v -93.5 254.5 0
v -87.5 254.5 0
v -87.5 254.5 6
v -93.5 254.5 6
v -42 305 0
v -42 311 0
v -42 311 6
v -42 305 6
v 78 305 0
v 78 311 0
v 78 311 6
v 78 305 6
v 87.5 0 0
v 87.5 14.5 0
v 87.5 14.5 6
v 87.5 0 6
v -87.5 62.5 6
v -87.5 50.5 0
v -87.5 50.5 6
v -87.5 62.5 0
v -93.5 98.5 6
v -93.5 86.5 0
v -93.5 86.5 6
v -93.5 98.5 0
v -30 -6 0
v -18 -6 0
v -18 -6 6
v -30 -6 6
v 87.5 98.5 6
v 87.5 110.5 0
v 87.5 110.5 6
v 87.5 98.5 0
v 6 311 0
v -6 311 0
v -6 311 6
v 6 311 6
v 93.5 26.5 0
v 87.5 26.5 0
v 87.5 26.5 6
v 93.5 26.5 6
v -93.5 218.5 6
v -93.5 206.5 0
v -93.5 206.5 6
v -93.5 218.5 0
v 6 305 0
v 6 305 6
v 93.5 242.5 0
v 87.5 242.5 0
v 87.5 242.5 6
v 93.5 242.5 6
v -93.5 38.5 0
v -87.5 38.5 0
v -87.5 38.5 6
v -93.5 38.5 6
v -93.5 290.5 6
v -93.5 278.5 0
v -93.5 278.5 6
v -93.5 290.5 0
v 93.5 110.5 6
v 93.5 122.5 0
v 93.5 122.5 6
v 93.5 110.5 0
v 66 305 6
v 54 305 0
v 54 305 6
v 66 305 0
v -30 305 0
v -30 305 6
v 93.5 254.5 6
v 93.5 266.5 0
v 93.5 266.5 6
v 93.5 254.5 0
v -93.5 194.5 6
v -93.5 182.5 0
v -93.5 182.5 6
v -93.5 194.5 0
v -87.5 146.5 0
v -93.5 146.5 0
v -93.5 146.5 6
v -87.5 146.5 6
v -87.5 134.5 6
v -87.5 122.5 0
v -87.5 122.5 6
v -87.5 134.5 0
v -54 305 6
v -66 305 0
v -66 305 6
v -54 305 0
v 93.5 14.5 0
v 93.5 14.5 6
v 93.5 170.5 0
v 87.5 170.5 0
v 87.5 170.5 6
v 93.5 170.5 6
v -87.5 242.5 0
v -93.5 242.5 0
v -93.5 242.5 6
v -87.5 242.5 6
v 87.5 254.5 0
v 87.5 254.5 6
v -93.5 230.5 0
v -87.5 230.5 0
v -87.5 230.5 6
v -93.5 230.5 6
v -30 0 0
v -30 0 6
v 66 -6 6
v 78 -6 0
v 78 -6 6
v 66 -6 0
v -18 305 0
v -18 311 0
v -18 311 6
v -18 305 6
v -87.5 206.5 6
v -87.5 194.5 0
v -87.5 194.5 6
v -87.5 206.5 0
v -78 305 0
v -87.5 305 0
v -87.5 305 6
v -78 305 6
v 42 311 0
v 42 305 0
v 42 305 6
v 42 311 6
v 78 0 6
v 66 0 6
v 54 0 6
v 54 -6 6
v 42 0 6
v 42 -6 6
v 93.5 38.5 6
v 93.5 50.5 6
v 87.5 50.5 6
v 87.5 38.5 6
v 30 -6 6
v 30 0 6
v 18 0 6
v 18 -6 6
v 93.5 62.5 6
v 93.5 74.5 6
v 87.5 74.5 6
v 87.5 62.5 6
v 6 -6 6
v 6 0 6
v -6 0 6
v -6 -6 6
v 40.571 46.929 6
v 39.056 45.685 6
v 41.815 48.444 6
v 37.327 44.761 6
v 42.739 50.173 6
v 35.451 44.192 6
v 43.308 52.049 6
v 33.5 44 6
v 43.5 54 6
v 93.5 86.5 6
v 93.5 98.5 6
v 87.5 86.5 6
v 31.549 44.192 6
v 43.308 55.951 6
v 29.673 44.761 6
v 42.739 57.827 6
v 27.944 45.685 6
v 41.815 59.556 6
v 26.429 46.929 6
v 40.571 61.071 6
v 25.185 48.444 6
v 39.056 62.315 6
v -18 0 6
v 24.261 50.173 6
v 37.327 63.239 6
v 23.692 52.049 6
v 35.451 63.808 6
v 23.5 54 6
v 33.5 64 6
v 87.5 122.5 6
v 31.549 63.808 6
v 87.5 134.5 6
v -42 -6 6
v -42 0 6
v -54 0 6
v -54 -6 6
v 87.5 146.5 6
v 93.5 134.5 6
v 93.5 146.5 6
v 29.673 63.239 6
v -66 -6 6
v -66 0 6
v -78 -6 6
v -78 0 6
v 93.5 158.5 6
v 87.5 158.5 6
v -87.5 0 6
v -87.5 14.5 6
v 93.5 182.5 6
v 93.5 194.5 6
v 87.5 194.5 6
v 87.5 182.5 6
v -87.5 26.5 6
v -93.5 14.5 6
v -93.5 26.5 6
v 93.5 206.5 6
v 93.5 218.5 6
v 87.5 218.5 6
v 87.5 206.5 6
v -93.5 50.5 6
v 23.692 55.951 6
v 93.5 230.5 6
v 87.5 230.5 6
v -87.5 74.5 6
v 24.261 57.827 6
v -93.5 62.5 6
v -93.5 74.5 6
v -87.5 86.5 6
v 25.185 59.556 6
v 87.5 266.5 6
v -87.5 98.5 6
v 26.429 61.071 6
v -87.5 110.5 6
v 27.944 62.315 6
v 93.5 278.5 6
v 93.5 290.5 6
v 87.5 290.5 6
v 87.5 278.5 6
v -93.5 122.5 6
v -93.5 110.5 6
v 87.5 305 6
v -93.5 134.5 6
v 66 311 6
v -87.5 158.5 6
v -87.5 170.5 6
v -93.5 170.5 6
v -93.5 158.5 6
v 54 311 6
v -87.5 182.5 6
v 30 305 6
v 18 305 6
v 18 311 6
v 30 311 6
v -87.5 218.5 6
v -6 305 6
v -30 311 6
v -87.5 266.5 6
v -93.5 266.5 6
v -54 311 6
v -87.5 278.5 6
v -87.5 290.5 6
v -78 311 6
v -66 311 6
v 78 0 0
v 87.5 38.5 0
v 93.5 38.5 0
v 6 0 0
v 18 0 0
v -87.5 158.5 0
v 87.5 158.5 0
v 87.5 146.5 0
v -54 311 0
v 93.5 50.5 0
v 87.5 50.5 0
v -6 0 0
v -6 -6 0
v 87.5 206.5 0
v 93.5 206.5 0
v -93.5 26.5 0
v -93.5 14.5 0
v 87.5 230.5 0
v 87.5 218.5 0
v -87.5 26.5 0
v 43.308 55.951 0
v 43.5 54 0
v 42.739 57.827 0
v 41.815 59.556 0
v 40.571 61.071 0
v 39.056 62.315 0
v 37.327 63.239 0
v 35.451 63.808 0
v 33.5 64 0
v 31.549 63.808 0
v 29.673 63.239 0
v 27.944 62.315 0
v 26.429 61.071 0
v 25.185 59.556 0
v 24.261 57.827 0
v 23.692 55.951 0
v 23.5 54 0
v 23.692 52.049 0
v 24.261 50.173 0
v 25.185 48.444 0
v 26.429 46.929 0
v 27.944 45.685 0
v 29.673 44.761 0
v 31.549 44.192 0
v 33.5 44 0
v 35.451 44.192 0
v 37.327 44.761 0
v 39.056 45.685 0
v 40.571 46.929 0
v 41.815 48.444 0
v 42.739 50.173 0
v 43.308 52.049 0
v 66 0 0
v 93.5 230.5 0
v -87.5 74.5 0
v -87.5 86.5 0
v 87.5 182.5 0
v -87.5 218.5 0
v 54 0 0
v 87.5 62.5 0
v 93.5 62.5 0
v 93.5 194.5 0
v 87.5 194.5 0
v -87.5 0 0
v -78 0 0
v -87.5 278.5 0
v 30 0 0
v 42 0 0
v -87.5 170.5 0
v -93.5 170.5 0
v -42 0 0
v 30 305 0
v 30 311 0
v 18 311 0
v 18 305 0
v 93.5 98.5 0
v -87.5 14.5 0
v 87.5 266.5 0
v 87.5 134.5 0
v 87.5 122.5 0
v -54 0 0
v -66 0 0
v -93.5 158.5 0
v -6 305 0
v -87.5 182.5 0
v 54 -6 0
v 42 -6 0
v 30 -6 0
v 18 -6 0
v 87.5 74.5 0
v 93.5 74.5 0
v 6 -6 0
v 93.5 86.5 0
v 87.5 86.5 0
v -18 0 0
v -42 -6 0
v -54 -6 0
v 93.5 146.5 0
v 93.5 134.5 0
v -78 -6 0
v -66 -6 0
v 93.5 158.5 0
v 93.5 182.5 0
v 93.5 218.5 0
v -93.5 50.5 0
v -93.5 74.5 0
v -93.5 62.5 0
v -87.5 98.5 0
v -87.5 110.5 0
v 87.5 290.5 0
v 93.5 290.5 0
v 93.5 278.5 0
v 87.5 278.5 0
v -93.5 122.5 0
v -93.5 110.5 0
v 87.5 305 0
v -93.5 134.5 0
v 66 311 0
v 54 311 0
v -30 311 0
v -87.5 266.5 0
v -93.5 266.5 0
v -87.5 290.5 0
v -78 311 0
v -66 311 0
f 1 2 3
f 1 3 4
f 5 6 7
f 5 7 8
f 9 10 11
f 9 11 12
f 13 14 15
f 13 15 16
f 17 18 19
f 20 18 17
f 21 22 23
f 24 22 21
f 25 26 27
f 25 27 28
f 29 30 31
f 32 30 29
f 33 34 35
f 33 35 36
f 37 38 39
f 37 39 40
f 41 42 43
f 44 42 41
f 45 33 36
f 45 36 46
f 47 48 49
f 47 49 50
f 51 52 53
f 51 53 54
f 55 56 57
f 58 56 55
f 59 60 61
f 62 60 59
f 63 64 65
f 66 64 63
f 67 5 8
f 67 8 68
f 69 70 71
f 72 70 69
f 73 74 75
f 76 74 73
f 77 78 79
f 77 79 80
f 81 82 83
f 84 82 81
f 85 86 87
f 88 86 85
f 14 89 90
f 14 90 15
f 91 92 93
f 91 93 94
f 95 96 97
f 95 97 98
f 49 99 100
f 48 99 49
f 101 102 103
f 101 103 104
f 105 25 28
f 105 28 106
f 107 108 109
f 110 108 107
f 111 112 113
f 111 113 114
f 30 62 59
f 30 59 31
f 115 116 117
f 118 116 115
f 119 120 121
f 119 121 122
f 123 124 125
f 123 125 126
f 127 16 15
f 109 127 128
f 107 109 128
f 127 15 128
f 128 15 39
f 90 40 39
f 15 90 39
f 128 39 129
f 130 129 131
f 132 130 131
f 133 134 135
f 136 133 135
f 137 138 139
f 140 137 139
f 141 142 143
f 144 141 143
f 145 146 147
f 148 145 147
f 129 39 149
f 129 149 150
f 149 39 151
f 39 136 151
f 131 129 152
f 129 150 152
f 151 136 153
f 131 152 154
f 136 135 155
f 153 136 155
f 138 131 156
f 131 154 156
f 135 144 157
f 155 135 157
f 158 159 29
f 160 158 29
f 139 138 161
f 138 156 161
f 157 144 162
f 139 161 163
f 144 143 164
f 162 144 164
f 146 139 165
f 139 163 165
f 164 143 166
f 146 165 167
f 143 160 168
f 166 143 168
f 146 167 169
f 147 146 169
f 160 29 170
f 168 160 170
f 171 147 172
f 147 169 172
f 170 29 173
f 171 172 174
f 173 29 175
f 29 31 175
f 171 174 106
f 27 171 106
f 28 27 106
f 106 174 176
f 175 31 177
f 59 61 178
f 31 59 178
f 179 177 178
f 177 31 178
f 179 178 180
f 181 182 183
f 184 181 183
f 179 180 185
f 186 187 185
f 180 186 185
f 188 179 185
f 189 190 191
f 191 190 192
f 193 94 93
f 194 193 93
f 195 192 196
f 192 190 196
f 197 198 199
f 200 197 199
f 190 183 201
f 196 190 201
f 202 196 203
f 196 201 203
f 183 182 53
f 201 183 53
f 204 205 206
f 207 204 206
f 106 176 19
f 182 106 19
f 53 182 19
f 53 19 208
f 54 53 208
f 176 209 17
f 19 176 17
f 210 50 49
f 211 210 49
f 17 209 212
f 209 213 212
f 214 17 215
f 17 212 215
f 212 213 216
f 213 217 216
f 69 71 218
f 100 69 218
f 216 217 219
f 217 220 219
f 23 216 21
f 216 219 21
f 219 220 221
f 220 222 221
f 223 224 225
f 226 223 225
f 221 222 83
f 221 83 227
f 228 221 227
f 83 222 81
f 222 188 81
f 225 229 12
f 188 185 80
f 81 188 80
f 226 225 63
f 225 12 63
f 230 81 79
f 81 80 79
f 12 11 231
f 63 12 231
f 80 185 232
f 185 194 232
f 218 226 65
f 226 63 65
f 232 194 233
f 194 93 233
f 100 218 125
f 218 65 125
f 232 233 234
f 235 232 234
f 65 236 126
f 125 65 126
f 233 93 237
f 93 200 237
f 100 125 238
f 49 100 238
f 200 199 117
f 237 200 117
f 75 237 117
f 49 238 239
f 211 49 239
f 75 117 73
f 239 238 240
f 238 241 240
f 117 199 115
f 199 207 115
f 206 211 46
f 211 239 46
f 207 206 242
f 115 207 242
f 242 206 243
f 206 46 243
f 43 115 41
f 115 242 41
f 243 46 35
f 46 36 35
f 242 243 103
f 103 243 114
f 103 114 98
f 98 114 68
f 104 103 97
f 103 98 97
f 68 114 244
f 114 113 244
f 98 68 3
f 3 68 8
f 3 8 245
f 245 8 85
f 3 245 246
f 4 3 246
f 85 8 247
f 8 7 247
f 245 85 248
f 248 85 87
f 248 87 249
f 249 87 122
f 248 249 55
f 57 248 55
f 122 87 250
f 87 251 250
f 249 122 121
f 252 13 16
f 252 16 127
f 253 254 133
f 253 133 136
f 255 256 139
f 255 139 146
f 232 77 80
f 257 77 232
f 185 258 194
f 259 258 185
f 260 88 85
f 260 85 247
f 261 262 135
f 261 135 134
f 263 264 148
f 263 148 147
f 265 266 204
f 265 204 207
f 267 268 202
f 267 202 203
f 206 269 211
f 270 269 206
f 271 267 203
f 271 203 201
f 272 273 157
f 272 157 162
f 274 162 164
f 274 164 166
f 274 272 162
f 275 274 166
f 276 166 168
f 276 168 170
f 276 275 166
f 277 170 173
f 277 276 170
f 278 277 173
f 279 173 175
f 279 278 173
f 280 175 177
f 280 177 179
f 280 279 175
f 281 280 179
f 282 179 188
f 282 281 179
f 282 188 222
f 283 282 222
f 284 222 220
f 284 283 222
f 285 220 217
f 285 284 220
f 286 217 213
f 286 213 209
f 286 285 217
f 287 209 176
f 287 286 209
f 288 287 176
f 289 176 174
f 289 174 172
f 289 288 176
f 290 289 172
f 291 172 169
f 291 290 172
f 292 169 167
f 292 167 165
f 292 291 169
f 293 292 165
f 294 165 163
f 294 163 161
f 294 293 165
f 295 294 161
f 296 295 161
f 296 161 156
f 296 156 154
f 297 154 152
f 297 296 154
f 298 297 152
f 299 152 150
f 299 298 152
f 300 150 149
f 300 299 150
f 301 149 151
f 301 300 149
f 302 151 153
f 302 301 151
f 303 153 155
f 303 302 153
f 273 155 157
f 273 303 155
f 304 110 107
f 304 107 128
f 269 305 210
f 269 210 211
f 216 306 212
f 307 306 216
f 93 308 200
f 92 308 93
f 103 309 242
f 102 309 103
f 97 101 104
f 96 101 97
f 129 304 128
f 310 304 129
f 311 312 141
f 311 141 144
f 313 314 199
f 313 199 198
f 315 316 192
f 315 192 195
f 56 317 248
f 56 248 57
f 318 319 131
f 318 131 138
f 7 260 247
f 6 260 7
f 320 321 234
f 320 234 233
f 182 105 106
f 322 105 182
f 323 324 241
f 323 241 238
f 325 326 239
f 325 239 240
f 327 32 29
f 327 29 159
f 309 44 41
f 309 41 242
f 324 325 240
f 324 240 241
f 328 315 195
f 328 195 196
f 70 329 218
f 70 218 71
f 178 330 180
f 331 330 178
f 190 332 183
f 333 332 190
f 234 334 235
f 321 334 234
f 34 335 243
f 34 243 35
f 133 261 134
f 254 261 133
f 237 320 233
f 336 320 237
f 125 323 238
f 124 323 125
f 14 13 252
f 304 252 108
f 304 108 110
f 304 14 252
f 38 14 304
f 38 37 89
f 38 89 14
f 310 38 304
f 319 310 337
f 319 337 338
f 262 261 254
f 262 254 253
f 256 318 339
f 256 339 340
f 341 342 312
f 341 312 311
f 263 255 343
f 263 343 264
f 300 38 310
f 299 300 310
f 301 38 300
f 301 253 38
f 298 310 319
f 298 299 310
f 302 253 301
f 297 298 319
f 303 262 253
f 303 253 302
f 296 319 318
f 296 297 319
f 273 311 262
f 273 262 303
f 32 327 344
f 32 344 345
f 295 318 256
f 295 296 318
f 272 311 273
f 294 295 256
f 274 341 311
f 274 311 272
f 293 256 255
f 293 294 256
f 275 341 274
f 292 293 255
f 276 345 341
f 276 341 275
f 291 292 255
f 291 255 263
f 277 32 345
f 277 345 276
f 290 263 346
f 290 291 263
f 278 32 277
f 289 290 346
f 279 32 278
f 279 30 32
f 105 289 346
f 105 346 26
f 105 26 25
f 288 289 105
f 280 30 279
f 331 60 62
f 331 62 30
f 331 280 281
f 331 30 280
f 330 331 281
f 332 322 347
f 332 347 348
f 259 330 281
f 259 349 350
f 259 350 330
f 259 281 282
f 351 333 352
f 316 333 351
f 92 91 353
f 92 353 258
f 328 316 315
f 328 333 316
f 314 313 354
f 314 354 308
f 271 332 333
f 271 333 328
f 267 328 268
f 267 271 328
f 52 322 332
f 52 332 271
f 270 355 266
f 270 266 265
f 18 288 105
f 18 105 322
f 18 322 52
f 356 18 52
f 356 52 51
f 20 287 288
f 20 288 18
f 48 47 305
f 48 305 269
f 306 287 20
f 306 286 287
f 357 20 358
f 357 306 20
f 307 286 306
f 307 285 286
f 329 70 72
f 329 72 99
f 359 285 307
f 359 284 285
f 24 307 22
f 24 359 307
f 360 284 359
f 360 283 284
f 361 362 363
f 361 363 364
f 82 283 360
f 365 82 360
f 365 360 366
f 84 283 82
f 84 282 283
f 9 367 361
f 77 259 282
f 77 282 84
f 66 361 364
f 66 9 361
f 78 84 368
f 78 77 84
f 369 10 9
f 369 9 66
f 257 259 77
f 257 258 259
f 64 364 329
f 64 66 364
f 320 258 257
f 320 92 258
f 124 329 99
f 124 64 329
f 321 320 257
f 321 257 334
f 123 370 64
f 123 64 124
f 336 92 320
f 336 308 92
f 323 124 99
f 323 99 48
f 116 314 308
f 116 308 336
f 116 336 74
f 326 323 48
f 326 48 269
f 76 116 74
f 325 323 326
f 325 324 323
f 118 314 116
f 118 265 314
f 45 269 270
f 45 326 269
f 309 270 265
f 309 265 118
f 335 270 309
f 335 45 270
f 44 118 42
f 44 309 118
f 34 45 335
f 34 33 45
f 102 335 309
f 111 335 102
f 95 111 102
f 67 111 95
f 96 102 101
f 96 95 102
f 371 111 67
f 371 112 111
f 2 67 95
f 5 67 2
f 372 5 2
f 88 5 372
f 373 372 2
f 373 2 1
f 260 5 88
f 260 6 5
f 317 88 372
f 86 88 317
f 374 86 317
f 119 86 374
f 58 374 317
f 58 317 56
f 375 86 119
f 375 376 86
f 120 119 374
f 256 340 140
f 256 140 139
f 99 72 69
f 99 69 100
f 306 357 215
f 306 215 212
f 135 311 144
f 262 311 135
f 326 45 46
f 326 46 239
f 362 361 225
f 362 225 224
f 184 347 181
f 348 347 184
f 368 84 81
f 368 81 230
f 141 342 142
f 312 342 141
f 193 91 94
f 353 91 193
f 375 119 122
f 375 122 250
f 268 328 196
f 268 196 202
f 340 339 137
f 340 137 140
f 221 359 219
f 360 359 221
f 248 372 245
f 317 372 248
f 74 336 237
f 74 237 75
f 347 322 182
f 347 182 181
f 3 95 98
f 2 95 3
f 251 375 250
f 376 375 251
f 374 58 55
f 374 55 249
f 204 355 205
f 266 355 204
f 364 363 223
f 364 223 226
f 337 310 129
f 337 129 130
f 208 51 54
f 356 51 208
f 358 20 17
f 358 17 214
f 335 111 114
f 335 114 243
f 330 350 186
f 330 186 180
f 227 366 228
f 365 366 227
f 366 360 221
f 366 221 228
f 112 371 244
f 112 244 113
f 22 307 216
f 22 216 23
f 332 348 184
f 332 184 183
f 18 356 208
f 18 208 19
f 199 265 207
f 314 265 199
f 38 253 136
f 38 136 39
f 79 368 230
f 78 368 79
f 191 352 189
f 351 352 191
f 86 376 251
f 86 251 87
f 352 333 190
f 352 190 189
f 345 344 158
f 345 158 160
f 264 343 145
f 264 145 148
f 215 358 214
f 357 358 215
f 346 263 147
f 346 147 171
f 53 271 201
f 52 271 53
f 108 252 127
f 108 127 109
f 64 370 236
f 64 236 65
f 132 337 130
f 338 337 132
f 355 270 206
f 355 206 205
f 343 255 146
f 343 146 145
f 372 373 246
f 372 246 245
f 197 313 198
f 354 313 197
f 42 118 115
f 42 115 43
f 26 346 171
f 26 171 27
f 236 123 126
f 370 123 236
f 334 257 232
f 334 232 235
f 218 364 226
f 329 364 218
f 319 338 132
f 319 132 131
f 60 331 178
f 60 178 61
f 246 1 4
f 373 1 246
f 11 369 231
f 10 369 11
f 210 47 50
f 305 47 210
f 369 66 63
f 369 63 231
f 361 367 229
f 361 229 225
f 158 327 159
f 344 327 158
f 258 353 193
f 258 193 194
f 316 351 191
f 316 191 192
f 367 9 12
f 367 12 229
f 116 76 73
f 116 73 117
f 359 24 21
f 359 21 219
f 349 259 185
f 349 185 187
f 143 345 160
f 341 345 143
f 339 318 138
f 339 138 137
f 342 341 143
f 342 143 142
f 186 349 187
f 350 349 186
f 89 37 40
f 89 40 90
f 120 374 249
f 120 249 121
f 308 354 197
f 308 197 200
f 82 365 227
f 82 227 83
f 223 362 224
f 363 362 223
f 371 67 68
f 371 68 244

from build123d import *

# Parameters (mm, degrees)
SKETCH1_R           = 10
BOSS_EXTRUDE1_DEPTH = 6


with BuildPart() as part:
    # Sketch1 → Boss-Extrude1 (new body)
    with BuildSketch(Plane.XY):
        Polygon((78, 0), (78, -6), (66, -6), (66, 0), (54, 0), (54, -6), (42, -6), (42, 0), (30, 0), (30, -6), (18, -6), (18, 0), (6, 0), (6, -6), (-6, -6), (-6, 0), (-18, 0), (-18, -6), (-30, -6), (-30, 0), (-42, 0), (-42, -6), (-54, -6), (-54, 0), (-66, 0), (-66, -6), (-78, -6), (-78, 0), (-87.5, 0), (-87.5, 14.5), (-93.5, 14.5), (-93.5, 26.5), (-87.5, 26.5), (-87.5, 38.5), (-93.5, 38.5), (-93.5, 50.5), (-87.5, 50.5), (-87.5, 62.5), (-93.5, 62.5), (-93.5, 74.5), (-87.5, 74.5), (-87.5, 86.5), (-93.5, 86.5), (-93.5, 98.5), (-87.5, 98.5), (-87.5, 110.5), (-93.5, 110.5), (-93.5, 122.5), (-87.5, 122.5), (-87.5, 134.5), (-93.5, 134.5), (-93.5, 146.5), (-87.5, 146.5), (-87.5, 158.5), (-93.5, 158.5), (-93.5, 170.5), (-87.5, 170.5), (-87.5, 182.5), (-93.5, 182.5), (-93.5, 194.5), (-87.5, 194.5), (-87.5, 206.5), (-93.5, 206.5), (-93.5, 218.5), (-87.5, 218.5), (-87.5, 230.5), (-93.5, 230.5), (-93.5, 242.5), (-87.5, 242.5), (-87.5, 254.5), (-93.5, 254.5), (-93.5, 266.5), (-87.5, 266.5), (-87.5, 278.5), (-93.5, 278.5), (-93.5, 290.5), (-87.5, 290.5), (-87.5, 305), (-78, 305), (-78, 311), (-66, 311), (-66, 305), (-54, 305), (-54, 311), (-42, 311), (-42, 305), (-30, 305), (-30, 311), (-18, 311), (-18, 305), (-6, 305), (-6, 311), (6, 311), (6, 305), (18, 305), (18, 311), (30, 311), (30, 305), (42, 305), (42, 311), (54, 311), (54, 305), (66, 305), (66, 311), (78, 311), (78, 305), (87.5, 305), (87.5, 290.5), (93.5, 290.5), (93.5, 278.5), (87.5, 278.5), (87.5, 266.5), (93.5, 266.5), (93.5, 254.5), (87.5, 254.5), (87.5, 242.5), (93.5, 242.5), (93.5, 230.5), (87.5, 230.5), (87.5, 218.5), (93.5, 218.5), (93.5, 206.5), (87.5, 206.5), (87.5, 194.5), (93.5, 194.5), (93.5, 182.5), (87.5, 182.5), (87.5, 170.5), (93.5, 170.5), (93.5, 158.5), (87.5, 158.5), (87.5, 146.5), (93.5, 146.5), (93.5, 134.5), (87.5, 134.5), (87.5, 122.5), (93.5, 122.5), (93.5, 110.5), (87.5, 110.5), (87.5, 98.5), (93.5, 98.5), (93.5, 86.5), (87.5, 86.5), (87.5, 74.5), (93.5, 74.5), (93.5, 62.5), (87.5, 62.5), (87.5, 50.5), (93.5, 50.5), (93.5, 38.5), (87.5, 38.5), (87.5, 26.5), (93.5, 26.5), (93.5, 14.5), (87.5, 14.5), (87.5, 0), align=None)
        with Locations((33.5, 54)):
            Circle(SKETCH1_R, mode=Mode.SUBTRACT)
    extrude(amount=BOSS_EXTRUDE1_DEPTH)


solid = part.part
